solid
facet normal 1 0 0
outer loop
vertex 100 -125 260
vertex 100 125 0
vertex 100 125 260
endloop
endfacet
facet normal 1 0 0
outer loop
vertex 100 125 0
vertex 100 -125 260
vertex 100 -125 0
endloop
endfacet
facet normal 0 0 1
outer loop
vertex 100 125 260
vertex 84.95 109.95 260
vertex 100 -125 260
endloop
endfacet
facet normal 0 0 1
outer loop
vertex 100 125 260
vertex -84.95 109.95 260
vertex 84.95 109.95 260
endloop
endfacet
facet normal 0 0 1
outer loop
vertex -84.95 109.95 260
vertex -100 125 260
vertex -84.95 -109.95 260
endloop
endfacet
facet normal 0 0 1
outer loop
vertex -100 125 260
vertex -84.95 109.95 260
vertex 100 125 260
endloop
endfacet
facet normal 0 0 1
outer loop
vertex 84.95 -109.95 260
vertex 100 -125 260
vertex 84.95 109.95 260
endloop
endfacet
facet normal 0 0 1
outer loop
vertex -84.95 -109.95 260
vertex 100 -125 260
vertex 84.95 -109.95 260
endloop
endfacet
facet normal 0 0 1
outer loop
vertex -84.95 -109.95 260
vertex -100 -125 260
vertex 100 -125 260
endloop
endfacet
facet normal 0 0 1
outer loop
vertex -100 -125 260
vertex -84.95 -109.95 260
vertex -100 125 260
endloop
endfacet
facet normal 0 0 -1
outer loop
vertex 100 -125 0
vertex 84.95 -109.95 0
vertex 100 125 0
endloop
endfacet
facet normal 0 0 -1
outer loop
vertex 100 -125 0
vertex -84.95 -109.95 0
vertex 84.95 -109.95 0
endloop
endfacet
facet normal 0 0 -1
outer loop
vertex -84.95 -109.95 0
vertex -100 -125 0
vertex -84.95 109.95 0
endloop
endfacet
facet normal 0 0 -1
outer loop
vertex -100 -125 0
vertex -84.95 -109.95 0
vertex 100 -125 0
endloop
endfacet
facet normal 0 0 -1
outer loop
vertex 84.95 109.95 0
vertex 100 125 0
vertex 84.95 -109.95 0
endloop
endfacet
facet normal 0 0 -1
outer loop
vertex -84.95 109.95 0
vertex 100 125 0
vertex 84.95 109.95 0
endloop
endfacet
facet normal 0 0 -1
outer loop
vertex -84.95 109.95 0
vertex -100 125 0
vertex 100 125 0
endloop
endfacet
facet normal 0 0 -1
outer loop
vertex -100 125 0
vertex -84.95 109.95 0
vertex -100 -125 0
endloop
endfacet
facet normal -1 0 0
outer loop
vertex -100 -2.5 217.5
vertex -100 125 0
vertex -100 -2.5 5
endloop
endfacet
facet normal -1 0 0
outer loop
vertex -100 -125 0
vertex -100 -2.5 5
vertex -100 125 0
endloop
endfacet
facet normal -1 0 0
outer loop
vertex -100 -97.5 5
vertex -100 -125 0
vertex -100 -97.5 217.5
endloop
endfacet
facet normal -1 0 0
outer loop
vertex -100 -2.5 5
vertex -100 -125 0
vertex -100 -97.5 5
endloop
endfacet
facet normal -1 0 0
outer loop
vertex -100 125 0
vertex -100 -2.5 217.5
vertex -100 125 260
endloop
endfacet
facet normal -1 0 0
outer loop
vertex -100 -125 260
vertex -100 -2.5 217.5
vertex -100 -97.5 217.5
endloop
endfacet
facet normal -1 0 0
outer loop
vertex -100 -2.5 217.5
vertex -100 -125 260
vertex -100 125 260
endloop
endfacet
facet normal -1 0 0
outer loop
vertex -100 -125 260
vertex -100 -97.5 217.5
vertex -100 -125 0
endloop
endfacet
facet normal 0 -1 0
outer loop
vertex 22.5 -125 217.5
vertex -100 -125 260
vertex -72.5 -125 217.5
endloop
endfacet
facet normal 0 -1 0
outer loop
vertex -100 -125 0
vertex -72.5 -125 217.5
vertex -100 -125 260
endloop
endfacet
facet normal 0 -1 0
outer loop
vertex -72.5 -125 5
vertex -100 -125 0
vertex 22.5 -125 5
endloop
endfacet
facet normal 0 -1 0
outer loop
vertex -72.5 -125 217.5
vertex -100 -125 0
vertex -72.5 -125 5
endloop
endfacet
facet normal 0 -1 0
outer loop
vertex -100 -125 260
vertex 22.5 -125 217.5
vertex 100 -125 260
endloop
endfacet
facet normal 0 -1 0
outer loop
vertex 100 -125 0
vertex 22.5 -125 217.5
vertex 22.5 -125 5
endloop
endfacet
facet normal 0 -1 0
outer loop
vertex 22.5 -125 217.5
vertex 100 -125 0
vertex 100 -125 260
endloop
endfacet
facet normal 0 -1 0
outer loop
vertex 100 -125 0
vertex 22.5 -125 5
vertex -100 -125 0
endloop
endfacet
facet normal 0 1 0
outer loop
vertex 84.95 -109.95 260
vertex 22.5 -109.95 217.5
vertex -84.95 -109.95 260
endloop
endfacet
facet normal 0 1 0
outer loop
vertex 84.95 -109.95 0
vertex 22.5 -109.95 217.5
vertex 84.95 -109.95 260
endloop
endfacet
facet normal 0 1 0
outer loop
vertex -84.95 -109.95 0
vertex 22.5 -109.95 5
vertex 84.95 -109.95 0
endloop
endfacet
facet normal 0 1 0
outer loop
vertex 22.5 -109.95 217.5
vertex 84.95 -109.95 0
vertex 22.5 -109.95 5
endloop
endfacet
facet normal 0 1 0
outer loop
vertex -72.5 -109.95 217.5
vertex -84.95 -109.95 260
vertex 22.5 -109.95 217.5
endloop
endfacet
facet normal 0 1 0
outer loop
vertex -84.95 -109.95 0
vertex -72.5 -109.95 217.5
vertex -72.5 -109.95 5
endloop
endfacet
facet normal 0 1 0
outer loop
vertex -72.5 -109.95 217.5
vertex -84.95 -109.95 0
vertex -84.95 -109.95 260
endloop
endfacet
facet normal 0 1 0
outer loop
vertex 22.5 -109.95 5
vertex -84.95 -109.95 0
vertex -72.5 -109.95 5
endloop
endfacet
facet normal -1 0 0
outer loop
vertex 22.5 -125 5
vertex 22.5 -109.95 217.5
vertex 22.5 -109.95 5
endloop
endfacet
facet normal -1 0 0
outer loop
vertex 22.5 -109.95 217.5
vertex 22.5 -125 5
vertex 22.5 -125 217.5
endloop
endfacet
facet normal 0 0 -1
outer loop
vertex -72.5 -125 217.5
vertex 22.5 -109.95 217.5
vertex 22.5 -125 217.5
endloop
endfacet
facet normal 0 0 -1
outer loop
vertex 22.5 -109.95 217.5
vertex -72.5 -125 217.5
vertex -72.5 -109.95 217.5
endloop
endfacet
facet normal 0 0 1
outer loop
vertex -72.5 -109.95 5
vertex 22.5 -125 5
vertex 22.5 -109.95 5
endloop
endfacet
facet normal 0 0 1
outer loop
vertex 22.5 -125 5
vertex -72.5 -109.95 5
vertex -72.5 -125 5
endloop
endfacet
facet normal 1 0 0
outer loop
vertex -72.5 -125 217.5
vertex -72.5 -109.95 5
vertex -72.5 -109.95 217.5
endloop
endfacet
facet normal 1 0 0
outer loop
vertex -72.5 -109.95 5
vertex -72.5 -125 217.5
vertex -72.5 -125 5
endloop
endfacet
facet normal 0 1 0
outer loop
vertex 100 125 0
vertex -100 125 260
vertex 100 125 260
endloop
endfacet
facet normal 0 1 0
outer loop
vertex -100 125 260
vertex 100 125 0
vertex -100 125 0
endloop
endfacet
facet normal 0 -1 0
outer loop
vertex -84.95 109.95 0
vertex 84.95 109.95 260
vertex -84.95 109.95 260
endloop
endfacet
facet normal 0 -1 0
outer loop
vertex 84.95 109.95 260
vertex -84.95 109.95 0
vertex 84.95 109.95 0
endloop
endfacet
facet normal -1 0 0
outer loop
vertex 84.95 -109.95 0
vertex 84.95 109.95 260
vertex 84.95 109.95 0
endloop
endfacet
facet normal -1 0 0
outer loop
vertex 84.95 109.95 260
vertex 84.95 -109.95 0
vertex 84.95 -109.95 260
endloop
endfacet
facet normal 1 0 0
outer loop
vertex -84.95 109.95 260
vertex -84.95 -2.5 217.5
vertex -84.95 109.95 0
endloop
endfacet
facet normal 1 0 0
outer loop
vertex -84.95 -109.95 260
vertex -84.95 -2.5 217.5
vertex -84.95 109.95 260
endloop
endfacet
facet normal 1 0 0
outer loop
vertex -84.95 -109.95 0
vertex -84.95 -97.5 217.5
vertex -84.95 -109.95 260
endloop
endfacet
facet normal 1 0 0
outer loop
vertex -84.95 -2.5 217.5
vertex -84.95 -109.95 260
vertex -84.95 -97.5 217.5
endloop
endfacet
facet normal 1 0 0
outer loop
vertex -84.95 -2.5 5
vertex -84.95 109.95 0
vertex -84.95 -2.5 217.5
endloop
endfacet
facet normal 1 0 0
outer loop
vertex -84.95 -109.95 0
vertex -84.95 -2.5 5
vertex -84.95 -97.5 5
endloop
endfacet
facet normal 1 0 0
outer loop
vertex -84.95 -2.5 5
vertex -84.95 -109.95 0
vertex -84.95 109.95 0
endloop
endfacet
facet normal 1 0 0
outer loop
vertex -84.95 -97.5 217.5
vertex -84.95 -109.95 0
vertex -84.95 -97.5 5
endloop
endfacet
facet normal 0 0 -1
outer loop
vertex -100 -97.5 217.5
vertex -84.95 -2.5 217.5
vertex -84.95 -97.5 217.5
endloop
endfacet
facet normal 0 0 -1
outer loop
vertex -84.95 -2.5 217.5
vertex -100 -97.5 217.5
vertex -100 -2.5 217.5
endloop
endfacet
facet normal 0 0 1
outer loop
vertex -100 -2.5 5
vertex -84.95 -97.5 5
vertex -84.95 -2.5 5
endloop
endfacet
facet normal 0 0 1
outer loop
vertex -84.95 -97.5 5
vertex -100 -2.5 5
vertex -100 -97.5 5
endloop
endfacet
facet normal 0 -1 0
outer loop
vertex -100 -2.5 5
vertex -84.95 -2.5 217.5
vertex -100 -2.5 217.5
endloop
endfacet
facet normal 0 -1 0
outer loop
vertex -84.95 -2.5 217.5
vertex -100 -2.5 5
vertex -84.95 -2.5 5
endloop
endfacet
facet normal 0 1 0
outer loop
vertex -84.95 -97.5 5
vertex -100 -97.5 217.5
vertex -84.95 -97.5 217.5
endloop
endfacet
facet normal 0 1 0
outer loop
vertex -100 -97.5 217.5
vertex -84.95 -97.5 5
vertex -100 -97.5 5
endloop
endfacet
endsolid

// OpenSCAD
// file: masterbedroomwalls.scad
module masterbedroomwalls(width=250, length=200, wall_thickness=15, wall_height=260,wall_color=[255/255, 255/255, 255/255],wall_alpha=1.0)
{
    // Colors
    paint_the_room = [55.0/255, 235/255,20/255];
    
    // Door opening size. Then we need some extra space for the door frame.
    door_width = 90+5;
    door_height = 210+2.5;
    
    // Position the door so that bottom of opening is 5 cm above floor level
    door_y_pos = (wall_height-door_height)/2 - 5;
        
    // Position the door horizontally off the center.
    door_x_pos = -width/5;
    side_door_x_pos = -width/10;
    
    // Rise the part of floor which should stay dry by 2.5 cm.
    rise_floor = 2.5;
    rised_width = width/2;
    
    // Rise walk in floor more to allow sitting to toilet seat with dry feet by 2.0 cm for 100 cm
    double_rise_floor = 2.0;
    double_rised_length = 100;
    
    // Hole size, 8 cm
    hole_size = 8;

    difference() {
        union() {
            translate([0,-width/2+wall_thickness/2, wall_height/2]) 
            color(wall_color,wall_alpha) 
            cube([length, wall_thickness, wall_height],center=true);
            
            translate([0,-width/2+wall_thickness, wall_height/2]) 
            color(paint_the_room,wall_alpha) 
            cube([length, 0.1, wall_height],center=true);
        }
    
        // Door 
            translate([side_door_x_pos,-width/2+wall_thickness/2, wall_height/2-door_y_pos]) cube([door_width, wall_thickness+1, door_height],center=true);
    }

    difference() {
        union() {
            translate([0,width/2-wall_thickness/2, wall_height/2]) color(wall_color,wall_alpha) cube([length,  wall_thickness, wall_height],center=true);
            translate([0,width/2-wall_thickness, wall_height/2]) color(paint_the_room,wall_alpha) cube([length,  0.1, wall_height],center=true);
        }
    }
    
    difference() {
        union() {
            translate([length/2-wall_thickness/2, 0, wall_height/2]) color(wall_color,wall_alpha) cube([wall_thickness, width, wall_height],center=true);
            translate([length/2-wall_thickness, 0, wall_height/2]) color(paint_the_room,wall_alpha) cube([0.1, width, wall_height],center=true);
        }
    }     

    difference() {
        union() {
            translate([-length/2+wall_thickness/2, 0, wall_height/2]) color(wall_color,wall_alpha) cube([wall_thickness, width, wall_height],center=true);
            translate([-length/2+wall_thickness, 0, wall_height/2])  color(paint_the_room,wall_alpha) cube([0.1, width, wall_height],center=true);
        }

        // Door
        translate([-length/2+wall_thickness/2, door_x_pos, wall_height/2-door_y_pos])
               cube([wall_thickness+1, door_width, door_height],center=true);
    }
}

// For testing
masterbedroomwalls();
// main file
 use <masterbedroomwalls.scad>

module masterbedroom(width=250, length=200, wall_thickness=15, wall_height=260,wall_color=[255/255, 255/255, 255/255],wall_alpha=1.0) 
{
    masterbedroomwalls(width, length, wall_thickness, wall_height ,wall_color,wall_alpha);
}

// For testing
masterbedroom();
